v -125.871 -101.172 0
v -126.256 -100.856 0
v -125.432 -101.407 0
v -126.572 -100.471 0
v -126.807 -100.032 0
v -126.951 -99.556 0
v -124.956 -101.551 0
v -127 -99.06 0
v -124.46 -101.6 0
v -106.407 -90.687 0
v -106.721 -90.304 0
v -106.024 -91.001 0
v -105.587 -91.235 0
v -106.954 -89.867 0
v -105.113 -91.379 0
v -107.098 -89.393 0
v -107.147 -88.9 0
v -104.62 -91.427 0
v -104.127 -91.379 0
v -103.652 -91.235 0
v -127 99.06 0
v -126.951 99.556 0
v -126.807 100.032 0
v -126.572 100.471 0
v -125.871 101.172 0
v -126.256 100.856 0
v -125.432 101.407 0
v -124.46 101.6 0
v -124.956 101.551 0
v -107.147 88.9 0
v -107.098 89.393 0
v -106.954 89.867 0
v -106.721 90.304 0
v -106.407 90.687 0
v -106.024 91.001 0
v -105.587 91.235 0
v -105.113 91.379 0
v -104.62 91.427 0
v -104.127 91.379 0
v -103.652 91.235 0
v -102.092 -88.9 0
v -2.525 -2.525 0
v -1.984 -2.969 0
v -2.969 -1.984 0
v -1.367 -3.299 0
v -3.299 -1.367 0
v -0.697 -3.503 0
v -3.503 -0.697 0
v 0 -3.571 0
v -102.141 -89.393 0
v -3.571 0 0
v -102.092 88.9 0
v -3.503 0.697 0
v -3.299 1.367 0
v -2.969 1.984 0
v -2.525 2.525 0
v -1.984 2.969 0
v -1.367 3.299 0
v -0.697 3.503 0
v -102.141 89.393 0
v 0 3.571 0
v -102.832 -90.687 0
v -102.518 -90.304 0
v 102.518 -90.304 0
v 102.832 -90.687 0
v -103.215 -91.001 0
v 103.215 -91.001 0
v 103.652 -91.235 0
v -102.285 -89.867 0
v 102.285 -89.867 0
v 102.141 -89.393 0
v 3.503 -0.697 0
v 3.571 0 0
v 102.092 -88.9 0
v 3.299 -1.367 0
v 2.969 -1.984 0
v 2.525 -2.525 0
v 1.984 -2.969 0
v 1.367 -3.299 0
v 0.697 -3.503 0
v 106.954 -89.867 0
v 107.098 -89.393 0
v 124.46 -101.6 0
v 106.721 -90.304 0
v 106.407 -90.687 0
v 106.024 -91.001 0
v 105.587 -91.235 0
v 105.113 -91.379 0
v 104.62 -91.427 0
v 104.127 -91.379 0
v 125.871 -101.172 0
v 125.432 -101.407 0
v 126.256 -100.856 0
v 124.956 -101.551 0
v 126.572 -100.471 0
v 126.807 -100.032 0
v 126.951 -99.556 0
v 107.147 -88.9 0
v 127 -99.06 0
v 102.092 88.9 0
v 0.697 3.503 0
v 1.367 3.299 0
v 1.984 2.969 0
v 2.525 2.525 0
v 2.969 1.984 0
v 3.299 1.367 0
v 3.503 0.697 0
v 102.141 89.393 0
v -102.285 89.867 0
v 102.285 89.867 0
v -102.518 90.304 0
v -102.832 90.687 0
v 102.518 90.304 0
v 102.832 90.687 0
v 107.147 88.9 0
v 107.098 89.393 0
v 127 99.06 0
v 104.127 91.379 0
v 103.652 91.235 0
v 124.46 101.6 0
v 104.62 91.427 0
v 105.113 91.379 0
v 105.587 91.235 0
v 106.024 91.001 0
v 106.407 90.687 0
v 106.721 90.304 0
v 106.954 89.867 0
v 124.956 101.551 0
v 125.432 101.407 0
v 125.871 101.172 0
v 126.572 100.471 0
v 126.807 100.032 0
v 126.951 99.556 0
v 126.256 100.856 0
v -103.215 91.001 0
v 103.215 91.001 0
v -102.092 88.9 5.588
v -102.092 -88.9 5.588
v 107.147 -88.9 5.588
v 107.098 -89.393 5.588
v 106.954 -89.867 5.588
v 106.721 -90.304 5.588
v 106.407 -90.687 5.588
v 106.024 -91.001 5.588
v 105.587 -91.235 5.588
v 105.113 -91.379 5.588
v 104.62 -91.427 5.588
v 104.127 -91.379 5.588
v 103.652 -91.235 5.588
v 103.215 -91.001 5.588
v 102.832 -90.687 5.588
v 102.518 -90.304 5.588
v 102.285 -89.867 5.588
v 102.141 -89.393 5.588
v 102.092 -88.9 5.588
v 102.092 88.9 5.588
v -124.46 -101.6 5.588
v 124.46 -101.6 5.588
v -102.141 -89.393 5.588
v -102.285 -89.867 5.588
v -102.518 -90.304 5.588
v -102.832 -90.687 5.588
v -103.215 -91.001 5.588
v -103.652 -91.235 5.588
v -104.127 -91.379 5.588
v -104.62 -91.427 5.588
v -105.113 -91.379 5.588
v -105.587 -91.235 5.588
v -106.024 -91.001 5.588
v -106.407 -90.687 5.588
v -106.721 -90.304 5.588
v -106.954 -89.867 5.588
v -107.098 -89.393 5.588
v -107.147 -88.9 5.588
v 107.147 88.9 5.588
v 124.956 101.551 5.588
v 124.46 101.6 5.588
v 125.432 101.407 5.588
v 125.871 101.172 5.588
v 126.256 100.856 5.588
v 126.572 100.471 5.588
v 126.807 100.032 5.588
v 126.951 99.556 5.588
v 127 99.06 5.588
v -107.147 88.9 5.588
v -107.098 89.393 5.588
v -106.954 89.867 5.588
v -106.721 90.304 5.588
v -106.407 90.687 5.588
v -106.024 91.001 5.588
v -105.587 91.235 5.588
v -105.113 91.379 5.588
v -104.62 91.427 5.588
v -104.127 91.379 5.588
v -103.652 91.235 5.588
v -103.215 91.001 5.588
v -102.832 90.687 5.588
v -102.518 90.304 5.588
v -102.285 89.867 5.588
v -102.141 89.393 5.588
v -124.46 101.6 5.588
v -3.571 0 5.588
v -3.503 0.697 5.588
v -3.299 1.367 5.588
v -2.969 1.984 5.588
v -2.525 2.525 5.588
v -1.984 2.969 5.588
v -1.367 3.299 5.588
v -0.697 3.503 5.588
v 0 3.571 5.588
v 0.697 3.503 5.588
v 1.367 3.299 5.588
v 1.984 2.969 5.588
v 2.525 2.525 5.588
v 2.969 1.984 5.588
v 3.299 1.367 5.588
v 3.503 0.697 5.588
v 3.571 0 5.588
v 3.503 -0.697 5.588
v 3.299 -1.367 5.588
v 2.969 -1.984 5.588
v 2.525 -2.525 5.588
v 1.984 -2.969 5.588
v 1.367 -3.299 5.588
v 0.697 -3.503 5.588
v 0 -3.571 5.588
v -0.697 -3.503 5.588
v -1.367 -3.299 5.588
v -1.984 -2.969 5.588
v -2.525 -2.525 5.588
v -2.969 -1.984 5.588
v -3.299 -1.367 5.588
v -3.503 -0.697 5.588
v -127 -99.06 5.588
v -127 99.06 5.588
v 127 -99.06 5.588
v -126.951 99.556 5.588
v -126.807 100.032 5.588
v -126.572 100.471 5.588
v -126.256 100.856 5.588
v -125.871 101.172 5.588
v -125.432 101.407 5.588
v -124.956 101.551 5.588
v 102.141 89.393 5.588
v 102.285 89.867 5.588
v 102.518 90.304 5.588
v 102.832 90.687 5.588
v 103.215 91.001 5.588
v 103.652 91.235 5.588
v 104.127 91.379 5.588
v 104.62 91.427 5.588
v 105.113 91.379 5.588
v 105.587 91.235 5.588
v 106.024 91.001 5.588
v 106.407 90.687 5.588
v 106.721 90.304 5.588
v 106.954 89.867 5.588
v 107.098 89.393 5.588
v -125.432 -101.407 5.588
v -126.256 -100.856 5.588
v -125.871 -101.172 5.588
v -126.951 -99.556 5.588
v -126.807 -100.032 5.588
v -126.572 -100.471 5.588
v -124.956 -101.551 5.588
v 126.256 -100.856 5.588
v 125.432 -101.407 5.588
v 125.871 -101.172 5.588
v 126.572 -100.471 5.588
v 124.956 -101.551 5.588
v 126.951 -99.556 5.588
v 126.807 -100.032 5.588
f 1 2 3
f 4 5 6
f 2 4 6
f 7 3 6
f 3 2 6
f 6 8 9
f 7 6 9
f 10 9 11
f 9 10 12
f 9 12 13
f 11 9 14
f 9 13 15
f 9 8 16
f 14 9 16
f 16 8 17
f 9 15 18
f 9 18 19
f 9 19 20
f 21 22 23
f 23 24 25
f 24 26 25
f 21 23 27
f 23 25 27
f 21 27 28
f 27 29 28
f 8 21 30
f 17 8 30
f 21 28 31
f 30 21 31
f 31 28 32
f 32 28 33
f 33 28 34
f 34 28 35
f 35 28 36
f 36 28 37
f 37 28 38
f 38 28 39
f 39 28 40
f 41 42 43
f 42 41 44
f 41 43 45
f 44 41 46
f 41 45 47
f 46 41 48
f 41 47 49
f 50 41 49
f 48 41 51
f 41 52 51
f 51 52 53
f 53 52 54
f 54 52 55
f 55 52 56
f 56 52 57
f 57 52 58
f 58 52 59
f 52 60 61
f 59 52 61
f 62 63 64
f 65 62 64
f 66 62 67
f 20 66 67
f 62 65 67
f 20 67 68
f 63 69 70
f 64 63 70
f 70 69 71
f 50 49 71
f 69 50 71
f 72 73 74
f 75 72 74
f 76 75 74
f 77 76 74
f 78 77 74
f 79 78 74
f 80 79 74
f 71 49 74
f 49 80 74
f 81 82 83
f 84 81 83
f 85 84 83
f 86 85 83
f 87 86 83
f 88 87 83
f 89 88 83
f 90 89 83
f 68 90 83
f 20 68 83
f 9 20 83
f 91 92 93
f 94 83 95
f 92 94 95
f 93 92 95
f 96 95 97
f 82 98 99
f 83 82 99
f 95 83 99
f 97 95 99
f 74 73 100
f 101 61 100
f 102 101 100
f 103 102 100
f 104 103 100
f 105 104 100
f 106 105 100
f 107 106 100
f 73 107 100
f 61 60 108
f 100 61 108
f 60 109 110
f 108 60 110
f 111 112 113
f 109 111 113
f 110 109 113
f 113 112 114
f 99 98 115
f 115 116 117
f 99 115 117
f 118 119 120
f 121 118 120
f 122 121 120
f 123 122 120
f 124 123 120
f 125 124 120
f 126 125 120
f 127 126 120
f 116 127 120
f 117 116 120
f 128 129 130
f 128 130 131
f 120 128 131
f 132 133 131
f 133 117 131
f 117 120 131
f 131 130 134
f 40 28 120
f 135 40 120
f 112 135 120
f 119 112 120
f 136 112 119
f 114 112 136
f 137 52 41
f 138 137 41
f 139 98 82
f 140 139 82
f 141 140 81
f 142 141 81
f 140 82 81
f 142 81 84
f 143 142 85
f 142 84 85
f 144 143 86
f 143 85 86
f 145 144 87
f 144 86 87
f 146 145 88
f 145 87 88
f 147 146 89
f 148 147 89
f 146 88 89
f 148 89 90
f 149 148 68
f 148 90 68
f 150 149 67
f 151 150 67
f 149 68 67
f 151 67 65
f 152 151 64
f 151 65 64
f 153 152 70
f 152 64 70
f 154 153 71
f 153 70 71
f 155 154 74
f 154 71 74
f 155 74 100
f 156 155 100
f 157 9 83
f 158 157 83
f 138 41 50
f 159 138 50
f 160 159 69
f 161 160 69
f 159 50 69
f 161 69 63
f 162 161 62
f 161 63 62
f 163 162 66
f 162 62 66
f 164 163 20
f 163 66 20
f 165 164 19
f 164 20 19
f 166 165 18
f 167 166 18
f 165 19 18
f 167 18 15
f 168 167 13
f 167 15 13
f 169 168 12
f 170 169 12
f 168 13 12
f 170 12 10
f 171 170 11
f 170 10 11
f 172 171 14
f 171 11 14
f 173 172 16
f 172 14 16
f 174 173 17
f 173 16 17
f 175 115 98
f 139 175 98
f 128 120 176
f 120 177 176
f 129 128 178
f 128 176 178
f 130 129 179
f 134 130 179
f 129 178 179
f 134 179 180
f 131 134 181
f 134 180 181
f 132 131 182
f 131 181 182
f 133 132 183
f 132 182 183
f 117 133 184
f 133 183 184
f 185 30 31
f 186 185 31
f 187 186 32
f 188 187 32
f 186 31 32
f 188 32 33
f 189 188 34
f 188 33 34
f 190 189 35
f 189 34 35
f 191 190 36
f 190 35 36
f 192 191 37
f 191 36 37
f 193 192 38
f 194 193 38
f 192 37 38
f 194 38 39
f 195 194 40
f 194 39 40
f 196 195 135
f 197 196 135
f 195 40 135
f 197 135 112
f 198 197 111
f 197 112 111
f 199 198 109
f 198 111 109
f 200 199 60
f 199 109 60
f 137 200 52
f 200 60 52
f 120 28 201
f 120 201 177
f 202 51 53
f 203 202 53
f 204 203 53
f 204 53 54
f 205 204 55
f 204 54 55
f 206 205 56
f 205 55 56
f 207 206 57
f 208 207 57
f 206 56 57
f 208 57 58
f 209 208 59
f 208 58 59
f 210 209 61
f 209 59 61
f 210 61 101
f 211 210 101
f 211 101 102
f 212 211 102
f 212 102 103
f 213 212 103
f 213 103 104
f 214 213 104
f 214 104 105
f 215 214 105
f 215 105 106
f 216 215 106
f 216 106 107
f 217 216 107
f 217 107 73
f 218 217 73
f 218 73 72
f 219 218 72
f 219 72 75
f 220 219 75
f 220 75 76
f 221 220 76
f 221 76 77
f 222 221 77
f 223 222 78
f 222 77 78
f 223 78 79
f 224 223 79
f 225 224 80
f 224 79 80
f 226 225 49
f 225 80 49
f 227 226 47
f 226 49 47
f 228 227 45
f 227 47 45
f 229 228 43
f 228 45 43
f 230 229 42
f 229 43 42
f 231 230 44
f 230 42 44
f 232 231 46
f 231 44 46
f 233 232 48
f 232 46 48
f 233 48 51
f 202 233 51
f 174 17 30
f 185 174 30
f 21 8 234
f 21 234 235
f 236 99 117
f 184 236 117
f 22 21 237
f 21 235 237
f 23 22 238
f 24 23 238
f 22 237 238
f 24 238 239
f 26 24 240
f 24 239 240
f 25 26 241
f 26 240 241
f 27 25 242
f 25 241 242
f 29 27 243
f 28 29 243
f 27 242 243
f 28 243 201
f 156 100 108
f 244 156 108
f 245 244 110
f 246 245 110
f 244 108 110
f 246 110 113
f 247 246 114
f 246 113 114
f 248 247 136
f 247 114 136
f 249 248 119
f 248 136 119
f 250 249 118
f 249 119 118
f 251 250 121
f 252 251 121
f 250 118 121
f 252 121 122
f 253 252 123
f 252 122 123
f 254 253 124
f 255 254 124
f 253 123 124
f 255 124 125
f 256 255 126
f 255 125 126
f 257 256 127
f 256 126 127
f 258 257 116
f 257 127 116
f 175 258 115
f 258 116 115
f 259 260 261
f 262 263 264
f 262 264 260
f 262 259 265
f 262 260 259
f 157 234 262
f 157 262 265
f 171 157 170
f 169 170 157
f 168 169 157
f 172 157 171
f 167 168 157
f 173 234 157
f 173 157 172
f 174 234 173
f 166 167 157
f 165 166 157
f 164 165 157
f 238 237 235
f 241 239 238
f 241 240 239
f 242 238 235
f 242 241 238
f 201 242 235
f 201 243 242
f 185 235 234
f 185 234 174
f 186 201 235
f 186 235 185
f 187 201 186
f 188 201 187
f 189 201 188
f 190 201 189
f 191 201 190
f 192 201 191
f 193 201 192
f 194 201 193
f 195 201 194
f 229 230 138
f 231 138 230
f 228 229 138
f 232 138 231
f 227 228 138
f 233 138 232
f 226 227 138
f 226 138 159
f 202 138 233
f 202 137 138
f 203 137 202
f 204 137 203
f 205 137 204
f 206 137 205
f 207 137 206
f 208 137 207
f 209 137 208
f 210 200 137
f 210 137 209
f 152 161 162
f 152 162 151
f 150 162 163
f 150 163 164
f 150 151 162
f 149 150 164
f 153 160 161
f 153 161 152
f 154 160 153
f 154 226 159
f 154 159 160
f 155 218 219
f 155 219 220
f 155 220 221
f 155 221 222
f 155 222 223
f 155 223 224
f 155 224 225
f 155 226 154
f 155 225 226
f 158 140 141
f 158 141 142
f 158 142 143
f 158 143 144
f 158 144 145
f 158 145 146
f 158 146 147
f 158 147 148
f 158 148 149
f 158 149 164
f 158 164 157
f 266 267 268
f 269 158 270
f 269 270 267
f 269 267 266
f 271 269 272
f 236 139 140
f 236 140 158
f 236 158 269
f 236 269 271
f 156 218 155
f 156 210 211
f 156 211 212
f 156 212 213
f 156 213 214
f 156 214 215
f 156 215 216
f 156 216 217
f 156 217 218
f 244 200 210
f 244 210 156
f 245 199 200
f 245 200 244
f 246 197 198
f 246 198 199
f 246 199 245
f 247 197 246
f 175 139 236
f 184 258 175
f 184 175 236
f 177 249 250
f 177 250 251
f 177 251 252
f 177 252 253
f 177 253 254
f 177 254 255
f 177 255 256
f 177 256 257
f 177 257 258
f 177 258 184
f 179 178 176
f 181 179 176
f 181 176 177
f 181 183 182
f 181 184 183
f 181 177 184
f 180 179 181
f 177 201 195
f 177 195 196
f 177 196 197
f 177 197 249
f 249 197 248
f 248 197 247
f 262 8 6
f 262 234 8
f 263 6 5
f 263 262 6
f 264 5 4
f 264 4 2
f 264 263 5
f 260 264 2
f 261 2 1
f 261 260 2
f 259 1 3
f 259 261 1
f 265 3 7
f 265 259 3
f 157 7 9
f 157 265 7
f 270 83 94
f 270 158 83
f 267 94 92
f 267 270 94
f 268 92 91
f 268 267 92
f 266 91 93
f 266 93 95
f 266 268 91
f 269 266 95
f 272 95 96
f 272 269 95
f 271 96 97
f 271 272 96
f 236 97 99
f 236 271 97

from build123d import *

# Parameters (mm, degrees)
SKETCH1_W               = 254
SKETCH1_H               = 203.2
BOSS_EXTRUDE1_DEPTH     = 5.588
F_1_4_CLEARANCE_HOLE1_D = 7.14248
FILLET1_R               = 2.54


with BuildPart() as part:
    # Sketch1 → Boss-Extrude1 (new body)
    with BuildSketch(Plane.XY):
        Rectangle(SKETCH1_W, SKETCH1_H)
        with BuildLine():
            Line((-102.092252, 88.9), (-102.092252, -88.9))
            ThreePointArc((-102.092252, -88.9), (-104.619552, -91.4273), (-107.146852, -88.9))
            Line((-107.146852, -88.9), (-107.146852, 88.9))
            ThreePointArc((-107.146852, 88.9), (-104.619552, 91.4273), (-102.092252, 88.9))
        make_face(mode=Mode.SUBTRACT)
        with BuildLine():
            Line((107.146852, 88.9), (107.146852, -88.9))
            ThreePointArc((107.146852, -88.9), (104.619552, -91.4273), (102.092252, -88.9))
            Line((102.092252, -88.9), (102.092252, 88.9))
            ThreePointArc((102.092252, 88.9), (104.619552, 91.4273), (107.146852, 88.9))
        make_face(mode=Mode.SUBTRACT)
    extrude(amount=BOSS_EXTRUDE1_DEPTH)

    # 1/4 Clearance Hole1 (through all)
    with Locations(Plane.XY.offset(5.588)):
        with Locations((0, 0)):
            Hole(F_1_4_CLEARANCE_HOLE1_D / 2)

    # Fillet1
    fillet1_edges = [part.edges().sort_by_distance(p)[0] for p in [
        (127, -101.6, 2.794),
        (-127, -101.6, 2.794),
        (-127, 101.6, 2.794),
        (127, 101.6, 2.794),
    ]]
    fillet(fillet1_edges, radius=FILLET1_R)


solid = part.part
